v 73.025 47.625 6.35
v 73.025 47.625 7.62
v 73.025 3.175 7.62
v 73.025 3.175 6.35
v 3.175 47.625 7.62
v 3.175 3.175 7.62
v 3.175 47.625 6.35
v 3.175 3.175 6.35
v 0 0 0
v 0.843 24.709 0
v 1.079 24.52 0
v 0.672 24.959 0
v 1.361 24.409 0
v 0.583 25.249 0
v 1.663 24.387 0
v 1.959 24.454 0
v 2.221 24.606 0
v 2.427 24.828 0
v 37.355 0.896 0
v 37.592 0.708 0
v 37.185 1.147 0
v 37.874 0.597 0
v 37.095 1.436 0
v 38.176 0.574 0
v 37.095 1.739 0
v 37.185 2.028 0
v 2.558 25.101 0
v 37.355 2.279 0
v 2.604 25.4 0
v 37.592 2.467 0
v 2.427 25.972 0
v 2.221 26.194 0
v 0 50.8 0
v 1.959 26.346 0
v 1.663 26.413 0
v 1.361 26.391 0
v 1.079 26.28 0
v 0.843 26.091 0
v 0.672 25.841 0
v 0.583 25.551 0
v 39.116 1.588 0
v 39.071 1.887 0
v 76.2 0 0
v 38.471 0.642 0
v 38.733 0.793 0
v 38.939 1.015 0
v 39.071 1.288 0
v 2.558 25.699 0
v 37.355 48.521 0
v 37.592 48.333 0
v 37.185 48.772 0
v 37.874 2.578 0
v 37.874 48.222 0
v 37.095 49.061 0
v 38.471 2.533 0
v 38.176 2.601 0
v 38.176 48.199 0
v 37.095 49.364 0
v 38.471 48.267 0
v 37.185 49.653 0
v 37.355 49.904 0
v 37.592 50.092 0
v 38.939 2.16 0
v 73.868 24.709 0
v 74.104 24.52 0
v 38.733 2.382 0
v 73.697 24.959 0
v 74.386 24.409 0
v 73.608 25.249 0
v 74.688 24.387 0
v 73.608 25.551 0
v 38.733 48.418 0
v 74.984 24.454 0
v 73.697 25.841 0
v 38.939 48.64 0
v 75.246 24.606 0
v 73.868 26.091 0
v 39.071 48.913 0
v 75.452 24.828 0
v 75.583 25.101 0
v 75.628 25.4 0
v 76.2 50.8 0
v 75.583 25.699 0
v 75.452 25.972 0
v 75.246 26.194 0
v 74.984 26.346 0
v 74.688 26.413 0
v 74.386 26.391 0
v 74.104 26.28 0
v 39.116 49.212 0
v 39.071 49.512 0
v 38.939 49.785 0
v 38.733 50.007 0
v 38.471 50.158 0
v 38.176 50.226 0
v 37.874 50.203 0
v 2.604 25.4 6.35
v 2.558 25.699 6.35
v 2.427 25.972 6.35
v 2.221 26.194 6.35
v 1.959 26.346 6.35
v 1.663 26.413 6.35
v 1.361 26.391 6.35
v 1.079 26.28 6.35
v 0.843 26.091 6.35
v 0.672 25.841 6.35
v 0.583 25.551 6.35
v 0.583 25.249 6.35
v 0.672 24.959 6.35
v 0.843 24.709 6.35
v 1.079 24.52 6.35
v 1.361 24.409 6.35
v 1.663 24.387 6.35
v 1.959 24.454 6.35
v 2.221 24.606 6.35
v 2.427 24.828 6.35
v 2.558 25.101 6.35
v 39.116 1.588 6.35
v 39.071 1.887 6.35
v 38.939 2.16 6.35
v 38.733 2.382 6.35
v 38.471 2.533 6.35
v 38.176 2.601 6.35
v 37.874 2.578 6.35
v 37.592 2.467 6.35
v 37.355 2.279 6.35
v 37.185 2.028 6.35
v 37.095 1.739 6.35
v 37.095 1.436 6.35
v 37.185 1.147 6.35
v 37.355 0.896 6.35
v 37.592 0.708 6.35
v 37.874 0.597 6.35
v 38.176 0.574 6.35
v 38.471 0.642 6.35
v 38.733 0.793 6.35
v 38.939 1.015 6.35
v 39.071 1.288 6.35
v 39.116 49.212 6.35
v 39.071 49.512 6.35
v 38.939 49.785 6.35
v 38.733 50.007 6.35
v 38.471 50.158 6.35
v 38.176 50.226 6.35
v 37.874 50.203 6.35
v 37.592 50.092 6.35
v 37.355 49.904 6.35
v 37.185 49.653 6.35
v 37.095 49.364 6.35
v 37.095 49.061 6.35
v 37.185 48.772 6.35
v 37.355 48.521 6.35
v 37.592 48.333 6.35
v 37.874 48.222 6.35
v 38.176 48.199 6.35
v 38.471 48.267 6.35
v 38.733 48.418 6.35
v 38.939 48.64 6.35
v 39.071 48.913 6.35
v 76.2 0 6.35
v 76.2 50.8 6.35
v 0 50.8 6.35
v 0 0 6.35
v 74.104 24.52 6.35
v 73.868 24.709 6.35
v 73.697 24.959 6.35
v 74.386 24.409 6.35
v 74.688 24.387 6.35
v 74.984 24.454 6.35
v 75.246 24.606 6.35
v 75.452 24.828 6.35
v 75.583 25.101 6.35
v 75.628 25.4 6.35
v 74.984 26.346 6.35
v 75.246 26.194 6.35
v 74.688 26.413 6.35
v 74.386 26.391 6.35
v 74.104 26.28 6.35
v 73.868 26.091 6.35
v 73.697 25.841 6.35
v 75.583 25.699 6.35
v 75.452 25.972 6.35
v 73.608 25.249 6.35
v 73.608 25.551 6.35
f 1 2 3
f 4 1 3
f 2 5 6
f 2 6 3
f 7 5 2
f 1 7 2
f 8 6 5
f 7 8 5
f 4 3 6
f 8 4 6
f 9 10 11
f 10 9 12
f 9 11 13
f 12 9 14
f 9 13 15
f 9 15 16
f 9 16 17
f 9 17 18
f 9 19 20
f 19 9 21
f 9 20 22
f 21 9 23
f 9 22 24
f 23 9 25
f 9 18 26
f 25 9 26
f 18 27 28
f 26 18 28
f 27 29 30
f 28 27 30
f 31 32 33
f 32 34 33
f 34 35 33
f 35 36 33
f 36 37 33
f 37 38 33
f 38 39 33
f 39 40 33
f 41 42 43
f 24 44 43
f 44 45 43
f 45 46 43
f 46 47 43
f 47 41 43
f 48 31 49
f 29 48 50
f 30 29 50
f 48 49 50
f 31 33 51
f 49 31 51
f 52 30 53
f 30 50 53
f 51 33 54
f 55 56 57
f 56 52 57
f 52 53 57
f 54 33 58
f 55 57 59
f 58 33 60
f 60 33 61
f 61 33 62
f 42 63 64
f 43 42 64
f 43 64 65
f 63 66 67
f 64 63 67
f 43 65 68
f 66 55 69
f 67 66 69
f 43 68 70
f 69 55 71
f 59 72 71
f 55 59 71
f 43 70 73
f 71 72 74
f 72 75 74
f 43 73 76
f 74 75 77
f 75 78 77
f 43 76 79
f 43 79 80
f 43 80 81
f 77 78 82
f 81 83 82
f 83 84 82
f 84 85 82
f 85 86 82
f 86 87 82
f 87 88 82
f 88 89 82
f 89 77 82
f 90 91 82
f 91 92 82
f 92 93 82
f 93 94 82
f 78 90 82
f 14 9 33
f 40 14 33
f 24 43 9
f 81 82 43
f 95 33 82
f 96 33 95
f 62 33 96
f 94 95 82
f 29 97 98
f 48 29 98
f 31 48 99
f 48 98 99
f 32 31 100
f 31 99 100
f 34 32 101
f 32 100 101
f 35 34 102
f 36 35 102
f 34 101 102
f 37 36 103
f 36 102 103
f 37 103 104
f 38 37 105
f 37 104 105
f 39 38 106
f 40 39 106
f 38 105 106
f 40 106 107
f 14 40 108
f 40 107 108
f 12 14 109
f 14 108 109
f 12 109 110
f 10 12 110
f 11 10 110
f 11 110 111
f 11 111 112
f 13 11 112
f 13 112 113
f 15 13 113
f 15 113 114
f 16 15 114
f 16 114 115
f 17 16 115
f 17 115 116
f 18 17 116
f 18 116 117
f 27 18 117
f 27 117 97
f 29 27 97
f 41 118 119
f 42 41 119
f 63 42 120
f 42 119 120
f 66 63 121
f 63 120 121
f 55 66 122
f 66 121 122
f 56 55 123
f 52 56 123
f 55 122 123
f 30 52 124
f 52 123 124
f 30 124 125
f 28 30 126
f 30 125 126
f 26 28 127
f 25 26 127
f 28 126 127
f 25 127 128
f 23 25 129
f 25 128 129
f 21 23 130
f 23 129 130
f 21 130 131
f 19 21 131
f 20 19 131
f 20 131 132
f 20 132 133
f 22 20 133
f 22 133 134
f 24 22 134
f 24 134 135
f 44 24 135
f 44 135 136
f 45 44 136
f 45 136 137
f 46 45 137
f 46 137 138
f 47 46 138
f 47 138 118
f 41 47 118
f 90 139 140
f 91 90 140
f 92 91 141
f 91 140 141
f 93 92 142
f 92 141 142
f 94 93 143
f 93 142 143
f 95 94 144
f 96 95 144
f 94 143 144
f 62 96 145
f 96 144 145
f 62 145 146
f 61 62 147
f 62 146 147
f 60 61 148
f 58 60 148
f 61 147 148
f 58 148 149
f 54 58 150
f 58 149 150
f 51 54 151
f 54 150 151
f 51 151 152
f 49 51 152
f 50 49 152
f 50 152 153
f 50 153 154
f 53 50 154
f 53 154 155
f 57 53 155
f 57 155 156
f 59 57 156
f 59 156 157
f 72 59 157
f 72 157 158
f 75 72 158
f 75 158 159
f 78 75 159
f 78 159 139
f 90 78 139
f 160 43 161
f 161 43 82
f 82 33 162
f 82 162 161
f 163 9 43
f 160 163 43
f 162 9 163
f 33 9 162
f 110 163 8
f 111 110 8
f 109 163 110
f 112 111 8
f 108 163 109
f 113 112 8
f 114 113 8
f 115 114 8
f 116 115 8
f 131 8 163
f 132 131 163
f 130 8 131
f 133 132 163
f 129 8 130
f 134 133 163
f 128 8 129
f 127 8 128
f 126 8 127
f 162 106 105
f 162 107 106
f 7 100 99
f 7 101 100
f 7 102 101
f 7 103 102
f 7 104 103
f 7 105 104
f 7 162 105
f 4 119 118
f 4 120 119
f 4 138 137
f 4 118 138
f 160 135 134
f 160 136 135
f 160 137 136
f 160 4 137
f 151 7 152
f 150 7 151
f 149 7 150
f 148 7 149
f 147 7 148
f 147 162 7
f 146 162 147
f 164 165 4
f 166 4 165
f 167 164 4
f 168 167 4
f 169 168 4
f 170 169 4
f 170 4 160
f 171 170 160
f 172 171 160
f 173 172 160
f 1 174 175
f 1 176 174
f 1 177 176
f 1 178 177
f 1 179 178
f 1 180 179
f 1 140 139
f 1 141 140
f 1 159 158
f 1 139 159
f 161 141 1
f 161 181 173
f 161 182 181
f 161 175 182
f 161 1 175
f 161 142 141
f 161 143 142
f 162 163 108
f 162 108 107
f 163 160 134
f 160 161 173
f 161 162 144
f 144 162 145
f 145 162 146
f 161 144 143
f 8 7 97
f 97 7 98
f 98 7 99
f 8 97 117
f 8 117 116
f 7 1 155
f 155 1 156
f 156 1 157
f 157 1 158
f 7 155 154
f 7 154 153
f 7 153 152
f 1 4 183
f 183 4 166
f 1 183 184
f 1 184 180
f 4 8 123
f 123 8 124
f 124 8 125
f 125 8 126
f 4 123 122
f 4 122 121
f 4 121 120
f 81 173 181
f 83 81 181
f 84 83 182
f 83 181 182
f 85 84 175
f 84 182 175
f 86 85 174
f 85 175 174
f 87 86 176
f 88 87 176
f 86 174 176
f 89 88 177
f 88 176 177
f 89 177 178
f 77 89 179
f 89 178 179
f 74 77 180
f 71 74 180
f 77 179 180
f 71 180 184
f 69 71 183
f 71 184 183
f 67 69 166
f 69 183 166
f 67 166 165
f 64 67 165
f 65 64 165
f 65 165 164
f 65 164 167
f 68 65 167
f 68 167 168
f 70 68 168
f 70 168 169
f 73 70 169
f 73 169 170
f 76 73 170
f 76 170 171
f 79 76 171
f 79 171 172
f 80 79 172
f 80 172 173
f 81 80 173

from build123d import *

# Parameters (mm, degrees)
SKETCH1_W           = 76.2
SKETCH1_H           = 50.8
BOSS_EXTRUDE1_DEPTH = 7.62
CUT_EXTRUDE3_DEPTH  = 1.27
SKETCH5_R           = 1.016
CUT_EXTRUDE4_DEPTH  = 92.800885072


with BuildPart() as part:
    # Sketch1 → Boss-Extrude1 (new body)
    with BuildSketch(Plane.XY):
        with Locations((38.1, 25.4)):
            Rectangle(SKETCH1_W, SKETCH1_H)
    extrude(amount=BOSS_EXTRUDE1_DEPTH)

    # Sketch4 → Cut-Extrude3 (cut)
    with BuildSketch(Plane.XY.offset(7.62)):
        Polygon((38.1, 47.625), (38.1, 50.8), (0, 50.8), (0, 0), (38.1, 0), (38.1, 3.175), (3.175, 3.175), (3.175, 47.625), align=None)
        Polygon((76.2, 50.8), (38.1, 50.8), (38.1, 47.625), (73.025, 47.625), (73.025, 3.175), (38.1, 3.175), (38.1, 0), (76.2, 0), align=None)
    extrude(amount=-CUT_EXTRUDE3_DEPTH, mode=Mode.SUBTRACT)

    # Sketch5 → Cut-Extrude4 (cut, through all)
    with BuildSketch(Plane.XY.offset(6.35)):
        with Locations((1.5875, 25.4)):
            Circle(SKETCH5_R)
        with Locations((38.1, 49.2125)):
            Circle(SKETCH5_R)
        with Locations((74.6125, 25.4)):
            Circle(SKETCH5_R)
        with Locations((38.1, 1.5875)):
            Circle(SKETCH5_R)
    extrude(amount=-CUT_EXTRUDE4_DEPTH, mode=Mode.SUBTRACT)


solid = part.part
